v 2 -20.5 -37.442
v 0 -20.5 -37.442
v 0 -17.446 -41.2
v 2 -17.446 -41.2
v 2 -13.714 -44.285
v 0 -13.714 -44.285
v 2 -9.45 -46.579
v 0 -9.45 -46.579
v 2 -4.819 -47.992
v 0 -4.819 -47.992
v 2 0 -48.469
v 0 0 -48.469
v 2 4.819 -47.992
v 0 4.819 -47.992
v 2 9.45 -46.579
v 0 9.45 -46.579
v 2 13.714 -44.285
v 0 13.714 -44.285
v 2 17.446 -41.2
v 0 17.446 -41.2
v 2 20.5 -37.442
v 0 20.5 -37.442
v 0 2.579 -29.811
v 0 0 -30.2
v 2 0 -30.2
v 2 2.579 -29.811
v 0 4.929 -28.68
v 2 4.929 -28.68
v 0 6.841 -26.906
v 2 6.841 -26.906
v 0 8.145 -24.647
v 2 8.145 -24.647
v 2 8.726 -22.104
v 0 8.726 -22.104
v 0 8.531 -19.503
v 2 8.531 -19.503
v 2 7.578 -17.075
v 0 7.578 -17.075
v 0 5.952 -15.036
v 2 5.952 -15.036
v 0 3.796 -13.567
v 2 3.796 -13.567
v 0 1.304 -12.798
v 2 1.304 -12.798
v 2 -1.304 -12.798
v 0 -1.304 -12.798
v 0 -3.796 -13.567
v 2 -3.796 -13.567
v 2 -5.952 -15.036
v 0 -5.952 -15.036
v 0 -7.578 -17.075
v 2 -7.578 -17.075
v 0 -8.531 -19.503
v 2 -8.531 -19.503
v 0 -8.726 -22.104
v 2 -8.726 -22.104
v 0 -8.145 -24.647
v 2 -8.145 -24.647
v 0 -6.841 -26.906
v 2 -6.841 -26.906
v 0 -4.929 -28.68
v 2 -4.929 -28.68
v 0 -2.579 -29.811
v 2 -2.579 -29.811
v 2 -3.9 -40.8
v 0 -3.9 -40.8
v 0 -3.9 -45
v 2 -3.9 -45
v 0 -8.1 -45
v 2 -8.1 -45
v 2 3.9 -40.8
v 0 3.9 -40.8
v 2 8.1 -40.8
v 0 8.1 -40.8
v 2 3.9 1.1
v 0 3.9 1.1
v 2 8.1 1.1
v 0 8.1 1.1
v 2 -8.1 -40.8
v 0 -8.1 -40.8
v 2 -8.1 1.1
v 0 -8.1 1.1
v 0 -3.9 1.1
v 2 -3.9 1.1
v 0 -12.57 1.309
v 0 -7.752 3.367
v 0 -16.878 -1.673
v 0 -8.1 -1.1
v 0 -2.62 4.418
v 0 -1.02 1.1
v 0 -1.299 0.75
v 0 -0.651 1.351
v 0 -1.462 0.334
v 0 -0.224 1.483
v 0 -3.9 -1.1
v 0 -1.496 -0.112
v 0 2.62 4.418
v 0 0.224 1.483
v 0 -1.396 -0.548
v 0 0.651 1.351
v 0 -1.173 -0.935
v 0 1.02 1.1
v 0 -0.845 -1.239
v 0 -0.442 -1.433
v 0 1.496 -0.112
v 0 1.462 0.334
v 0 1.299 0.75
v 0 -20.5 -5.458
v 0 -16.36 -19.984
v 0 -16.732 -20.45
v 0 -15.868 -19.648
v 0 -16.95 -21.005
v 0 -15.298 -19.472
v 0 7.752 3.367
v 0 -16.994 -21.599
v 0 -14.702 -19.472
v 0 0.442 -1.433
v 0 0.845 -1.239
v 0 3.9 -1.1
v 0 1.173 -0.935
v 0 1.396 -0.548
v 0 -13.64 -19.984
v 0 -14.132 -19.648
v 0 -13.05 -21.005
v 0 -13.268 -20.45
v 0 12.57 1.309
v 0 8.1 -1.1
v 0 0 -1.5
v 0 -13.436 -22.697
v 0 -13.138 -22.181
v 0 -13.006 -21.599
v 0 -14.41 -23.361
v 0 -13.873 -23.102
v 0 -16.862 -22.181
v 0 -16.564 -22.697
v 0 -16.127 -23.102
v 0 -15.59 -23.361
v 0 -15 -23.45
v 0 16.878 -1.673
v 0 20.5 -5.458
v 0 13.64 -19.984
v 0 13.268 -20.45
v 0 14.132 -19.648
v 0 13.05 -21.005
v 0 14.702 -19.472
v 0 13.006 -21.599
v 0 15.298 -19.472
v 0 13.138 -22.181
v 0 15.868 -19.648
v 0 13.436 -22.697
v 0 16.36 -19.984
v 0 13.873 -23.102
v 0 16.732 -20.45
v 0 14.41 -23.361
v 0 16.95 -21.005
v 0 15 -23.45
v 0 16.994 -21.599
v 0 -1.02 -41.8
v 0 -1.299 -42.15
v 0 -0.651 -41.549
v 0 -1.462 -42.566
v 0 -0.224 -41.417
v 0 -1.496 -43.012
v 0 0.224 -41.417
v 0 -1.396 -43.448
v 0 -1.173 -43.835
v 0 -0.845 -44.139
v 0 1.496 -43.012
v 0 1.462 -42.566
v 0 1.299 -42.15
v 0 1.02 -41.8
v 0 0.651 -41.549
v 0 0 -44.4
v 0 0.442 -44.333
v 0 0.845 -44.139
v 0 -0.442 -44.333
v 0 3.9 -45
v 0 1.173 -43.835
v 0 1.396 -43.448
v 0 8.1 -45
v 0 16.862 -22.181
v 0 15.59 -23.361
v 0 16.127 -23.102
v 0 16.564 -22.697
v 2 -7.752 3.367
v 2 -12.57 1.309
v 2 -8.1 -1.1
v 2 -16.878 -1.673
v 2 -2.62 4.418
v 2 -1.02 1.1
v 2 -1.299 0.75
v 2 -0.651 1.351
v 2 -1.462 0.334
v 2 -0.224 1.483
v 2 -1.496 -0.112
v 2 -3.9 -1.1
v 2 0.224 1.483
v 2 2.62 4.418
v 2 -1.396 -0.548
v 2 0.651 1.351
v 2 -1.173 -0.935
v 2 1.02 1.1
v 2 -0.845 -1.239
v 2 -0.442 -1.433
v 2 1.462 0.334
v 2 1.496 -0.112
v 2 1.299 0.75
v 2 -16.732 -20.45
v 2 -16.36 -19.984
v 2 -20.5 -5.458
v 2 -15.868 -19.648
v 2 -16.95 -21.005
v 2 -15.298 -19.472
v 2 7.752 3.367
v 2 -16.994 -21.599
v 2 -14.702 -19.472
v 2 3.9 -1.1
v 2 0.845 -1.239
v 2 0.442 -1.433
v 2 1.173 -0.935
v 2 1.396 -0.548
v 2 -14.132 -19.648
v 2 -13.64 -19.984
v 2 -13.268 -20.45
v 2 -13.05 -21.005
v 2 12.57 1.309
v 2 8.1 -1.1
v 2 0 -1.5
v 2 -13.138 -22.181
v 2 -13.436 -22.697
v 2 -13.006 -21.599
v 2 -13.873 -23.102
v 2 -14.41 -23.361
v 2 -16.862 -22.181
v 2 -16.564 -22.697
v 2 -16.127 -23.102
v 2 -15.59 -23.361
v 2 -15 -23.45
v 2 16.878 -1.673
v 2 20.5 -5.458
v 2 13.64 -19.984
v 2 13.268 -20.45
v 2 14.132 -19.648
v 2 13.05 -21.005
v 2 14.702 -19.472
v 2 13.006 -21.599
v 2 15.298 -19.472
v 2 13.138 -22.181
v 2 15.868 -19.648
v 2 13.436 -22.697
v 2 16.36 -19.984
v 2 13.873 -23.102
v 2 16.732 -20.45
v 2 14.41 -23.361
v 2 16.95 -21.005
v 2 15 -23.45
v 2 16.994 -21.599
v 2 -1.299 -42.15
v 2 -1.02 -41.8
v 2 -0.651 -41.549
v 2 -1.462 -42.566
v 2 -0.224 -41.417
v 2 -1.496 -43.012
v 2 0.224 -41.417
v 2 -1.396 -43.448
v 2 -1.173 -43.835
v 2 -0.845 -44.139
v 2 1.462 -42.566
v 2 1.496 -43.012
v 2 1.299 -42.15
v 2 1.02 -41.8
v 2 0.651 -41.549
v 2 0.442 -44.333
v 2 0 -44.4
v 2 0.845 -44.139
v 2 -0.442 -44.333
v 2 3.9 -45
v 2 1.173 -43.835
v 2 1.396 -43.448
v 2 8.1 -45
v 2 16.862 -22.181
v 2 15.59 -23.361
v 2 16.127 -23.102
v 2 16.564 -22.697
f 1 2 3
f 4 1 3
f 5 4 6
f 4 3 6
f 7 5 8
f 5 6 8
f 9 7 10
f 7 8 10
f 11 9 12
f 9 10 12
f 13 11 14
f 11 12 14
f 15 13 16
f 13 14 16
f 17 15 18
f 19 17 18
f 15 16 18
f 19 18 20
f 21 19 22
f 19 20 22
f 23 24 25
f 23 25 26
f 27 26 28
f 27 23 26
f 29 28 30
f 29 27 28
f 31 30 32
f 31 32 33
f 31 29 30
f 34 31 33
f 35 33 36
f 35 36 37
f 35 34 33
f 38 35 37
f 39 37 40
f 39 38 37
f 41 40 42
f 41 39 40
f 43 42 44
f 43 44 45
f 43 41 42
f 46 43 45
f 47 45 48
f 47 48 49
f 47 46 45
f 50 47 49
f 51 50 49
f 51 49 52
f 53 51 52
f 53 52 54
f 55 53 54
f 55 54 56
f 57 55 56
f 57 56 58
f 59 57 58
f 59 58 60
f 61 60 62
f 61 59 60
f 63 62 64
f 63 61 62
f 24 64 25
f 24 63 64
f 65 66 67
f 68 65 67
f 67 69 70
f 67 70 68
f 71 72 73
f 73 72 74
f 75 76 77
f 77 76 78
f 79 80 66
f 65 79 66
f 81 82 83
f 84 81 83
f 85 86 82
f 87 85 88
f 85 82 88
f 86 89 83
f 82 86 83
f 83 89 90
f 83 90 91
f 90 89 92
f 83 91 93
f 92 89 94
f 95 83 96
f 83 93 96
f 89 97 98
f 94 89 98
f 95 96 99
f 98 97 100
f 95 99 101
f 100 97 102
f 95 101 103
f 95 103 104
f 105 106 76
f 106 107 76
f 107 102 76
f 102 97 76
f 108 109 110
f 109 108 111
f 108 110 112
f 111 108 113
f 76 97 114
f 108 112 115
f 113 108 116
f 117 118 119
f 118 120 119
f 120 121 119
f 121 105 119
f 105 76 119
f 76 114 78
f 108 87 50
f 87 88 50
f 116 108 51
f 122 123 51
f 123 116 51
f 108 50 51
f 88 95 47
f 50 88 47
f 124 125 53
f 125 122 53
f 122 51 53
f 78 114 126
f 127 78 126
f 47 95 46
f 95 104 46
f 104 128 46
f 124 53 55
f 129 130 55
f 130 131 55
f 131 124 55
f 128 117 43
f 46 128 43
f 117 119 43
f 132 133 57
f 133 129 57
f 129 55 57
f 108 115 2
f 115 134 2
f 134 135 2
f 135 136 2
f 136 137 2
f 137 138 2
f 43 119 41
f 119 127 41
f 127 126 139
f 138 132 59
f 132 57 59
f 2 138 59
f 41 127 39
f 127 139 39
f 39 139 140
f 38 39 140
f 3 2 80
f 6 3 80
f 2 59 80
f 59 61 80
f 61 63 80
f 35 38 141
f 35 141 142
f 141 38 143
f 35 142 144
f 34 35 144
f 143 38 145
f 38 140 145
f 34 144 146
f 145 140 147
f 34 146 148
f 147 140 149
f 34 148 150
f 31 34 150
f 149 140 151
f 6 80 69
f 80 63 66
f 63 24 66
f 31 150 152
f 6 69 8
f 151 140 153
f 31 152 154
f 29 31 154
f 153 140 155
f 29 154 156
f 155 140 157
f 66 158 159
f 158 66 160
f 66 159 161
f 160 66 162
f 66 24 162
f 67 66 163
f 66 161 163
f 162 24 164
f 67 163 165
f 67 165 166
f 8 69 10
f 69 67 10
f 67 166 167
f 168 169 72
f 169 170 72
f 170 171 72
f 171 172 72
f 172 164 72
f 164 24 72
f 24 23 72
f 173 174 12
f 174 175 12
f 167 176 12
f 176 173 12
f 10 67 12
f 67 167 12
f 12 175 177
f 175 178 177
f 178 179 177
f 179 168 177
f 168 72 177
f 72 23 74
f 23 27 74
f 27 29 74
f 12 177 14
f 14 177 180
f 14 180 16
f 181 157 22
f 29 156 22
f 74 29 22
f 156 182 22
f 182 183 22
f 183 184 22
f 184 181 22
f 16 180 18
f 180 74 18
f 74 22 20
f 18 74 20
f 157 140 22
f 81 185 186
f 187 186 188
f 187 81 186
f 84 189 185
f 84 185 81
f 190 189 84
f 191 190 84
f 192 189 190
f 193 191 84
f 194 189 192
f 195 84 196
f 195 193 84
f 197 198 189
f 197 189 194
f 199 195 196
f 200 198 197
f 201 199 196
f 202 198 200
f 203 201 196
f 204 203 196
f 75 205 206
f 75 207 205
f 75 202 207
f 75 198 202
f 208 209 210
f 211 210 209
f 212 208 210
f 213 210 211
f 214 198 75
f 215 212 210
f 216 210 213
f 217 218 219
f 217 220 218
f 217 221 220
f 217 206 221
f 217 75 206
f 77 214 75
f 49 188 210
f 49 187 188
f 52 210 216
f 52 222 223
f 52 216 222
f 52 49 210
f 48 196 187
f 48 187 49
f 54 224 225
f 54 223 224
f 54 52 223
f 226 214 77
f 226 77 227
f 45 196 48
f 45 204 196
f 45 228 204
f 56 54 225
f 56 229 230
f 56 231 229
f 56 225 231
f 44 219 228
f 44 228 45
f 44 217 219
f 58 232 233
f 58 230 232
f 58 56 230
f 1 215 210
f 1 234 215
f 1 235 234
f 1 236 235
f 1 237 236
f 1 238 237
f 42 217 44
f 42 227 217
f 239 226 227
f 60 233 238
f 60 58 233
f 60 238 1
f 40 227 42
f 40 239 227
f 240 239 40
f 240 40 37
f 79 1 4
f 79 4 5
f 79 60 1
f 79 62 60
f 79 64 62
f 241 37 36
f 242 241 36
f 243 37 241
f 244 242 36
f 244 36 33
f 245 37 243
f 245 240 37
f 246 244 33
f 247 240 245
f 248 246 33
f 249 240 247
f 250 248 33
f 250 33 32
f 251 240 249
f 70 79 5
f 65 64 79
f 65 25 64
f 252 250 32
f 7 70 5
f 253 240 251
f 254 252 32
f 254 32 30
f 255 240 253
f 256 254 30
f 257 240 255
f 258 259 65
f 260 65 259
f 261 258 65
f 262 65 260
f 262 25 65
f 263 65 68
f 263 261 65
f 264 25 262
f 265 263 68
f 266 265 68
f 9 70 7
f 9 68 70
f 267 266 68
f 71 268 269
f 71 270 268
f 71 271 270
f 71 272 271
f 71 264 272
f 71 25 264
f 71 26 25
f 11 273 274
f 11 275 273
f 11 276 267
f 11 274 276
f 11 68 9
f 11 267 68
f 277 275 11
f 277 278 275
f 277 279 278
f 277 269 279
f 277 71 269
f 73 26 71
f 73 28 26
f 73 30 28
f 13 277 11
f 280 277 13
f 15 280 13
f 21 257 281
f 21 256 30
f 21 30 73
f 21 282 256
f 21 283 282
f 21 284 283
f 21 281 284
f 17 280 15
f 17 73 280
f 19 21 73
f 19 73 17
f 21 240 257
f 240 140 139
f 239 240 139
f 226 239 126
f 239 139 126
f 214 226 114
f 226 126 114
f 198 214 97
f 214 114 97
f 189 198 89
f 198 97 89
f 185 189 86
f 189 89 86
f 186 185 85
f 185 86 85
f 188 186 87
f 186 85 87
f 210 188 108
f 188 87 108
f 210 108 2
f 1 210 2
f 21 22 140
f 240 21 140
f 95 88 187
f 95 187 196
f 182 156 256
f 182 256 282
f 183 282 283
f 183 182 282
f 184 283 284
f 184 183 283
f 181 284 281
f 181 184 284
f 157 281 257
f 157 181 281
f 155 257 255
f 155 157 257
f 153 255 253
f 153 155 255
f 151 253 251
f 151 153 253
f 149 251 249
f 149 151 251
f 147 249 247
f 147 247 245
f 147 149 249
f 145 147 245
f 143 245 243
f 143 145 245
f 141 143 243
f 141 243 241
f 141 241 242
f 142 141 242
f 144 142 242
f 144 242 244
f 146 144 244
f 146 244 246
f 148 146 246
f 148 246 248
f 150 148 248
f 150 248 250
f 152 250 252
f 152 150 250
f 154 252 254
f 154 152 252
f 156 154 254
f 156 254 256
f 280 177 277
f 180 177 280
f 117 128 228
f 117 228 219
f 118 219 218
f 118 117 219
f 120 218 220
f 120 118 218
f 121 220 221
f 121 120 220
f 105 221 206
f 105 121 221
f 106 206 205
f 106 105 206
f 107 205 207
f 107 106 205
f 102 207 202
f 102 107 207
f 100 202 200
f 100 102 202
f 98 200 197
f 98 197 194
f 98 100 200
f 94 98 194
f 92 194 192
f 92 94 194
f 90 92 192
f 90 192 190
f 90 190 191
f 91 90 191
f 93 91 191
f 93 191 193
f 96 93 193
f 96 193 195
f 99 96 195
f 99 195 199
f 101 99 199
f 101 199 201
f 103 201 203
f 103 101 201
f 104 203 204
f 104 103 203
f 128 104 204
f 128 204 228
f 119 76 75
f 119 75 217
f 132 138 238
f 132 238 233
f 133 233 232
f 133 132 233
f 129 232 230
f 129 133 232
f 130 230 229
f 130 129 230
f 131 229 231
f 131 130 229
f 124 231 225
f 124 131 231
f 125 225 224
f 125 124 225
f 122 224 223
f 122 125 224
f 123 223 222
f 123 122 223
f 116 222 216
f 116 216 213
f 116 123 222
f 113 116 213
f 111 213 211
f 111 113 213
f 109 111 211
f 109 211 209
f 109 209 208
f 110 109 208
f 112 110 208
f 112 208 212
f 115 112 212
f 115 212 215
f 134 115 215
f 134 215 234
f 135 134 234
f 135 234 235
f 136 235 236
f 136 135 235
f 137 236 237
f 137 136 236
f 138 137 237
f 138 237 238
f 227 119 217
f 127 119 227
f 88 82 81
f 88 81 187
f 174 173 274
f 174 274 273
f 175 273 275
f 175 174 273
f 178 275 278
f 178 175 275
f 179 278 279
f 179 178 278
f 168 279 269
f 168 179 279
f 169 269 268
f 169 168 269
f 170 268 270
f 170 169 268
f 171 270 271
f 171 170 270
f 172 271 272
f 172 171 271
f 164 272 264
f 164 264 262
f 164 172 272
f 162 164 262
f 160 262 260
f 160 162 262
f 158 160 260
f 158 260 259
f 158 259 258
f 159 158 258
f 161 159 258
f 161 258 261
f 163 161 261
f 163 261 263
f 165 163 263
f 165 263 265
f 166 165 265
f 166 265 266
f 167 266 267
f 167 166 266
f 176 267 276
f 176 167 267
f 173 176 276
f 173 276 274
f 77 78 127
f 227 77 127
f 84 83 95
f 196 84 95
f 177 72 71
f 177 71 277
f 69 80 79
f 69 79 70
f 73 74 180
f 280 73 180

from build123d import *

# Parameters (mm, degrees)
SKETCH_1_R      = 2
SKETCH_1_R_2    = 8.75
SKETCH_1_R_3    = 1.5
SKETCH_1_W      = 2.2
SKETCH_1_H      = 4.2
SKETCH_1_W_2    = 4.2
EXTRUDE_1_DEPTH = 2


with BuildPart() as part:
    # 草图1 → 凸台-拉伸1 (new body)
    with BuildSketch(Plane(origin=(0, 0, 0), x_dir=(0, 0, -1), z_dir=(1, 0, 0))):
        with BuildLine():
            Line((21.45, -20.5), (37.442185592, -20.5))
            ThreePointArc((37.442185592, -20.5), (48.468724148, 0), (37.442185592, 20.5))
            Line((37.442185592, 20.5), (21.45, 20.5))
            Line((21.45, 20.5), (5.457814408, 20.5))
            ThreePointArc((5.457814408, 20.5), (-4.55, 0), (5.457814408, -20.5))
            Line((5.457814408, -20.5), (21.45, -20.5))
        make_face()
        with Locations((21.45, 15)):
            Circle(SKETCH_1_R, mode=Mode.SUBTRACT)
        with Locations((21.45, -15)):
            Circle(SKETCH_1_R, mode=Mode.SUBTRACT)
        with Locations((21.45, 0)):
            Circle(SKETCH_1_R_2, mode=Mode.SUBTRACT)
        Circle(SKETCH_1_R_3, mode=Mode.SUBTRACT)
        with Locations((42.9, 0)):
            Circle(SKETCH_1_R_3, mode=Mode.SUBTRACT)
        with Locations((0, 6)):
            Rectangle(SKETCH_1_W, SKETCH_1_H, mode=Mode.SUBTRACT)
        with Locations((0, -6)):
            Rectangle(SKETCH_1_W, SKETCH_1_H, mode=Mode.SUBTRACT)
        with Locations((42.9, 6)):
            Rectangle(SKETCH_1_W_2, SKETCH_1_H, mode=Mode.SUBTRACT)
        with Locations((42.9, -6)):
            Rectangle(SKETCH_1_W_2, SKETCH_1_H, mode=Mode.SUBTRACT)
    extrude(amount=EXTRUDE_1_DEPTH)


solid = part.part
